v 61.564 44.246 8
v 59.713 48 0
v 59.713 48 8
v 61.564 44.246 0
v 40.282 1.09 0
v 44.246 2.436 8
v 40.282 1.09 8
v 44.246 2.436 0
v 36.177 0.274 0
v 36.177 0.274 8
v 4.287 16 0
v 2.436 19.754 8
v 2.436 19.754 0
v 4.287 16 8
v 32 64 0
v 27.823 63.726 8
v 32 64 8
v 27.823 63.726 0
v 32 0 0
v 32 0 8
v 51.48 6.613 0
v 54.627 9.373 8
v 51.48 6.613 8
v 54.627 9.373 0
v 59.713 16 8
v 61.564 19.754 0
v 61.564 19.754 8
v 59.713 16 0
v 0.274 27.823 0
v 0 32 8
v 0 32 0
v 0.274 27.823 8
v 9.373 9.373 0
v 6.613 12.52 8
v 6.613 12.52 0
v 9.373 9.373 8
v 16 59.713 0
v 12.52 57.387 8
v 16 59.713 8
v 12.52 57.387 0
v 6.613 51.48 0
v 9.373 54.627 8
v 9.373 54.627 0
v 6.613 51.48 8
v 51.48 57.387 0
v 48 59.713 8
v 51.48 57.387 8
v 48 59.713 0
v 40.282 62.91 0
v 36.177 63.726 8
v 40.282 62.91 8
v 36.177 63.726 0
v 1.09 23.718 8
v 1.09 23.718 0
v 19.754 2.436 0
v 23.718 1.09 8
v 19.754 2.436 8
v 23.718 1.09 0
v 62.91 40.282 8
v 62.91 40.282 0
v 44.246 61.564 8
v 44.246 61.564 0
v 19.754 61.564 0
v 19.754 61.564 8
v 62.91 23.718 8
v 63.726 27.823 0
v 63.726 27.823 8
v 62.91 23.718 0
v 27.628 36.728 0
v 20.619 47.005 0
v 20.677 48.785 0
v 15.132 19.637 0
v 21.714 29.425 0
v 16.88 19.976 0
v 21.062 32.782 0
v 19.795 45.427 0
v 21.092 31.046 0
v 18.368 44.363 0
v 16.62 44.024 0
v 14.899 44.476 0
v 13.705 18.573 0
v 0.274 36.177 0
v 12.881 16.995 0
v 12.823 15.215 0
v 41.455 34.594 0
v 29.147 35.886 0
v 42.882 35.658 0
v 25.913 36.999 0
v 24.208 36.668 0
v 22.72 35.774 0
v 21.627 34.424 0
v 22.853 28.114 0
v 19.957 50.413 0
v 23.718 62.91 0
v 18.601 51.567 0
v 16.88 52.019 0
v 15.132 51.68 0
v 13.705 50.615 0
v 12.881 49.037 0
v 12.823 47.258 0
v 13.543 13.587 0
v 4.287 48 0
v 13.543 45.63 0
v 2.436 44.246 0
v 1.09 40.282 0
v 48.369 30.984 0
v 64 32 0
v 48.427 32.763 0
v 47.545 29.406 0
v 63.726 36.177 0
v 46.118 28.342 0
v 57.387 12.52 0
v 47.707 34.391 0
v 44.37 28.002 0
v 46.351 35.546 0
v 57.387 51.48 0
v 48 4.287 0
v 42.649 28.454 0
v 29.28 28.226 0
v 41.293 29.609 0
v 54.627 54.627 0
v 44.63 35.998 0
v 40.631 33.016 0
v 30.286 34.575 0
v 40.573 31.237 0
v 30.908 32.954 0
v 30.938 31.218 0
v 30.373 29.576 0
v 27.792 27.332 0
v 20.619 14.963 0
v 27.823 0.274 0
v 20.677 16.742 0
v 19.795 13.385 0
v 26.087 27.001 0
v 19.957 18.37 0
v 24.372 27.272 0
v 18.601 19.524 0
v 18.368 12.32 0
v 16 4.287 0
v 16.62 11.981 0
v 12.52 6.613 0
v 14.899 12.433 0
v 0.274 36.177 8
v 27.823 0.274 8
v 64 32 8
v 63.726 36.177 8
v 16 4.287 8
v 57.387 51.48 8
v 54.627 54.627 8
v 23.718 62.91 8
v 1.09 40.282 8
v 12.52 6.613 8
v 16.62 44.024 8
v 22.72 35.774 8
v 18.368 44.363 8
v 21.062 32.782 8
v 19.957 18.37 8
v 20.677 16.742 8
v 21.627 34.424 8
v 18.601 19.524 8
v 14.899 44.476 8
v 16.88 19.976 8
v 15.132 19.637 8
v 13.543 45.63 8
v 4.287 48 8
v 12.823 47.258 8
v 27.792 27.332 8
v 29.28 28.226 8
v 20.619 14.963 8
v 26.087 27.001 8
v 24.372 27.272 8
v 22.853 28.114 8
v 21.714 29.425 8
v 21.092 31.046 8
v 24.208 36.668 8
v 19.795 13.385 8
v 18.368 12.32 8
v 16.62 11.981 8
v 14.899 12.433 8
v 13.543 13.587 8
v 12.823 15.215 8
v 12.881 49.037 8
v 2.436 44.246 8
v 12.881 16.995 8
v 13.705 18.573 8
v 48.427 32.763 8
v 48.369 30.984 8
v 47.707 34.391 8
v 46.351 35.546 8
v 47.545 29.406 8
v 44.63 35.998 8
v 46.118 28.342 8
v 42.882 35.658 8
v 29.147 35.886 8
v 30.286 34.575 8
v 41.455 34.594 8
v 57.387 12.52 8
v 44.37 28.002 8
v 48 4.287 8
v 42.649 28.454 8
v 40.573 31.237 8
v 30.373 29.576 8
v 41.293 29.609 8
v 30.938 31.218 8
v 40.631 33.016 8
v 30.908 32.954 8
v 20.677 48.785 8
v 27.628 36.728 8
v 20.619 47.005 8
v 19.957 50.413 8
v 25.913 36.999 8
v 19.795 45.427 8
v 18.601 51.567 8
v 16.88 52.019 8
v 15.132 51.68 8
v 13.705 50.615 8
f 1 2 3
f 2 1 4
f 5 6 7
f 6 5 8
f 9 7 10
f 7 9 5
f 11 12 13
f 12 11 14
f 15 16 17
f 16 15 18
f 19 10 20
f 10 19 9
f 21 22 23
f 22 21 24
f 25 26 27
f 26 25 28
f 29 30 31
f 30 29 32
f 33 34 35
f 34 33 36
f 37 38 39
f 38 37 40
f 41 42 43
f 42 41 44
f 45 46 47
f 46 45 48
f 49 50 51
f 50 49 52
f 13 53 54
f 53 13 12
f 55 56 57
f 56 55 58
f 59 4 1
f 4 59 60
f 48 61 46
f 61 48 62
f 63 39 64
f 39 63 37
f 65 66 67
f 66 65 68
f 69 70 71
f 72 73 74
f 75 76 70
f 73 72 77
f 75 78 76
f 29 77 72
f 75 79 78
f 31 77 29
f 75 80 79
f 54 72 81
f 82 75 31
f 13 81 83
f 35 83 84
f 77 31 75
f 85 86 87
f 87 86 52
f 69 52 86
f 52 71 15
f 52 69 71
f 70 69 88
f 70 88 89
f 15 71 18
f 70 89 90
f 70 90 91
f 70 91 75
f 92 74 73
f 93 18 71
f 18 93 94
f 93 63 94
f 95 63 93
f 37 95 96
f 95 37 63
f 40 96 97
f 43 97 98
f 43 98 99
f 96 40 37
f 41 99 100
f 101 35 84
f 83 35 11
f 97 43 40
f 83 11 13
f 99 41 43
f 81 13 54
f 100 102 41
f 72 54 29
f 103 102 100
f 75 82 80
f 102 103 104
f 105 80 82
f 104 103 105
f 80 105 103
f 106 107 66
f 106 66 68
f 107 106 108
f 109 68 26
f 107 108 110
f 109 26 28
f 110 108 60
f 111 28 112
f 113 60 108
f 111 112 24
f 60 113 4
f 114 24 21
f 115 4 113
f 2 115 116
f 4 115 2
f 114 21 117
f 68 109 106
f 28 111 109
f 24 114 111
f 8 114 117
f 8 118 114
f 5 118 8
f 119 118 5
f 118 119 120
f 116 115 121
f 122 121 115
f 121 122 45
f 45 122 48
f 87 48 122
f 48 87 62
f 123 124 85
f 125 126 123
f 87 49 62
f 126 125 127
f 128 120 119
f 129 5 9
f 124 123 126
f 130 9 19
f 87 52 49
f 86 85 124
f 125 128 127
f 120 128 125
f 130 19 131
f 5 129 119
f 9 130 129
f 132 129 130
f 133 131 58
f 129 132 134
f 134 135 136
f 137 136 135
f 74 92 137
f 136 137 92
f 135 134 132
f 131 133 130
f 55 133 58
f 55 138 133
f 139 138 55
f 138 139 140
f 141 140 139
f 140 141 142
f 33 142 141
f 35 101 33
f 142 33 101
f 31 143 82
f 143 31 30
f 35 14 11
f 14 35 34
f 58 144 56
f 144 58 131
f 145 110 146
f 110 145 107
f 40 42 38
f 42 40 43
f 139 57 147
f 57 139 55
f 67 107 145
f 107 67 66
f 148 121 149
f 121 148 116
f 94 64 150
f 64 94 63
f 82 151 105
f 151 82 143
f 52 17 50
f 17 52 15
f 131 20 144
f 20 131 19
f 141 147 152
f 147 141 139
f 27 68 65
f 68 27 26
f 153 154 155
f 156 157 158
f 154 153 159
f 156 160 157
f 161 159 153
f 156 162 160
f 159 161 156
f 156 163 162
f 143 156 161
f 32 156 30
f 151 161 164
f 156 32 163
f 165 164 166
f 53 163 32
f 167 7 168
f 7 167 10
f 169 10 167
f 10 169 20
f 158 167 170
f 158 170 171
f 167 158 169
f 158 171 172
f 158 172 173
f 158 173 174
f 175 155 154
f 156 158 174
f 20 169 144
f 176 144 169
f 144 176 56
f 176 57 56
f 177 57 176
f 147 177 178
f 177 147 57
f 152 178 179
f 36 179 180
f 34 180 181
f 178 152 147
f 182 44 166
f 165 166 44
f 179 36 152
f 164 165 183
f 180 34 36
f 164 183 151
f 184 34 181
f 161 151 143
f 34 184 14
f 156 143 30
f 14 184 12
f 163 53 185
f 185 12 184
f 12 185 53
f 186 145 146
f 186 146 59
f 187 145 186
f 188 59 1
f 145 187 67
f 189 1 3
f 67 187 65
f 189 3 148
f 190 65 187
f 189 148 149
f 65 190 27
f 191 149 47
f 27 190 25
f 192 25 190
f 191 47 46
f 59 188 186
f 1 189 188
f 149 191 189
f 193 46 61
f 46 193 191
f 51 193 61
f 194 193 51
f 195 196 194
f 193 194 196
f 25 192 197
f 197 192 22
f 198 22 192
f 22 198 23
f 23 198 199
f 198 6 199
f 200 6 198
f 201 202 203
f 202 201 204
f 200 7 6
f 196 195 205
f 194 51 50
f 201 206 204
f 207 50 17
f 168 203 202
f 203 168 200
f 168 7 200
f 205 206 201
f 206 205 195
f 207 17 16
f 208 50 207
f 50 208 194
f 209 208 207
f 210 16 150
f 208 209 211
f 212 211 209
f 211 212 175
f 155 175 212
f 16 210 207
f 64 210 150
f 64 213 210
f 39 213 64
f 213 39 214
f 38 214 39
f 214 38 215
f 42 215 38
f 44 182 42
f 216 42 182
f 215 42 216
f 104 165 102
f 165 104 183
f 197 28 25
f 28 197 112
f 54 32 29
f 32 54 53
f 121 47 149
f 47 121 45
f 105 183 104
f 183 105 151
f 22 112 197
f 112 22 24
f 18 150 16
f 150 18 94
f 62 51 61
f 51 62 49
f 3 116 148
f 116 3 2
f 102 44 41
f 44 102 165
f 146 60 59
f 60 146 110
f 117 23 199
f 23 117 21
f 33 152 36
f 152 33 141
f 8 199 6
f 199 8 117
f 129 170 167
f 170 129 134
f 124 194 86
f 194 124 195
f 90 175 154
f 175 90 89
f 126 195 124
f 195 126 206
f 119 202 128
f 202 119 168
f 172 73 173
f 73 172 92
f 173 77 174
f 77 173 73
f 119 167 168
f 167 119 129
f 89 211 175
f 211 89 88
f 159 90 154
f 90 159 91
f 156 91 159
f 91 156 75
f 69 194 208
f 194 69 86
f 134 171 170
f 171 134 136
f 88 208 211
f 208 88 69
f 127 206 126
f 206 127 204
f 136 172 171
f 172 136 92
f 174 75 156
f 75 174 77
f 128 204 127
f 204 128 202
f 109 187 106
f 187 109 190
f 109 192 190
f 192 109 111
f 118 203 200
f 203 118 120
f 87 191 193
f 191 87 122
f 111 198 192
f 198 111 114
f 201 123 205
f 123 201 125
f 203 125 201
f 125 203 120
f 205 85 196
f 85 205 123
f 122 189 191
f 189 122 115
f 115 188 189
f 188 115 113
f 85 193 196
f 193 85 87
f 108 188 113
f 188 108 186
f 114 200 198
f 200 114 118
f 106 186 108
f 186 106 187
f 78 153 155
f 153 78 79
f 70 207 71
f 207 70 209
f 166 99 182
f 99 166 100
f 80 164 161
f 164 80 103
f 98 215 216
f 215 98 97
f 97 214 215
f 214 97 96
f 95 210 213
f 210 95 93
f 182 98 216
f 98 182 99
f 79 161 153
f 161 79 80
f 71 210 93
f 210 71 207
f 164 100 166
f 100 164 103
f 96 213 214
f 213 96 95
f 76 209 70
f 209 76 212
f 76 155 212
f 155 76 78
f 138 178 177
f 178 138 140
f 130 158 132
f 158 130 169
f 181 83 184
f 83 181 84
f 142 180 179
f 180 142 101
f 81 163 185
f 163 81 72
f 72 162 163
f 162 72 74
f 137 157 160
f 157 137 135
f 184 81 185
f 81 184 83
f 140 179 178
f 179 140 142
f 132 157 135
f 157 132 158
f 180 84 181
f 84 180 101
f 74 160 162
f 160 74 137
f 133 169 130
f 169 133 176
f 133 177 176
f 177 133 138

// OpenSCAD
$fn = 32;

// ----------------------------------------------------------------------
// Cam plate: eccentric cam, base R32
// ----------------------------------------------------------------------

// --- parameters (mm) ---
base_r = 32;              // base circle radius
lobe_h = 12;              // cam lobe rise
bore_r = 5;               // shaft bore radius
plate_t = 8;              // plate thickness, Z (extrusion height)
ecc = 6;                  // disc eccentricity
ring_r = 18.5;            // lightening ring radius
bolt_r = 4;               // lightening hole radius

profile = [[64, 32], [63.726, 36.177], [62.91, 40.282], [61.564, 44.246], [59.713, 48], [57.387, 51.48], [54.627, 54.627], [51.48, 57.387], [48, 59.713], [44.246, 61.564], [40.282, 62.91], [36.177, 63.726], [32, 64], [27.823, 63.726], [23.718, 62.91], [19.754, 61.564], [16, 59.713], [12.52, 57.387], [9.373, 54.627], [6.613, 51.48], [4.287, 48], [2.436, 44.246], [1.09, 40.282], [0.274, 36.177], [0, 32], [0.274, 27.823], [1.09, 23.718], [2.436, 19.754], [4.287, 16], [6.613, 12.52], [9.373, 9.373], [12.52, 6.613], [16, 4.287], [19.754, 2.436], [23.718, 1.09], [27.823, 0.274], [32, 0], [36.177, 0.274], [40.282, 1.09], [44.246, 2.436], [48, 4.287], [51.48, 6.613], [54.627, 9.373], [57.387, 12.52], [59.713, 16], [61.564, 19.754], [62.91, 23.718], [63.726, 27.823]];  // primary outline, 48 points, counter clockwise
void_1 = [[30.908, 32.954], [30.286, 34.575], [29.147, 35.886], [27.628, 36.728], [25.913, 36.999], [24.208, 36.668], [22.72, 35.774], [21.627, 34.424], [21.062, 32.782], [21.092, 31.046], [21.714, 29.425], [22.853, 28.114], [24.372, 27.272], [26.087, 27.001], [27.792, 27.332], [29.28, 28.226], [30.373, 29.576], [30.938, 31.218]];  // shaft bore, 18 points
void_2 = [[48.427, 32.763], [47.707, 34.391], [46.351, 35.546], [44.63, 35.998], [42.882, 35.658], [41.455, 34.594], [40.631, 33.016], [40.573, 31.237], [41.293, 29.609], [42.649, 28.454], [44.37, 28.002], [46.118, 28.342], [47.545, 29.406], [48.369, 30.984]];  // lightening hole 1, 14 points
void_3 = [[20.677, 48.785], [19.957, 50.413], [18.601, 51.567], [16.88, 52.019], [15.132, 51.68], [13.705, 50.615], [12.881, 49.037], [12.823, 47.258], [13.543, 45.63], [14.899, 44.476], [16.62, 44.024], [18.368, 44.363], [19.795, 45.427], [20.619, 47.005]];  // lightening hole 2, 14 points
void_4 = [[20.677, 16.742], [19.957, 18.37], [18.601, 19.524], [16.88, 19.976], [15.132, 19.637], [13.705, 18.573], [12.881, 16.995], [12.823, 15.215], [13.543, 13.587], [14.899, 12.433], [16.62, 11.981], [18.368, 12.32], [19.795, 13.385], [20.619, 14.963]];  // lightening hole 3, 14 points

// --- the one profile operation ---
difference() {
  linear_extrude(height = plate_t) polygon(points = profile);
  translate([0, 0, -1])
    linear_extrude(height = plate_t + 2) polygon(points = void_1);
  translate([0, 0, -1])
    linear_extrude(height = plate_t + 2) polygon(points = void_2);
  translate([0, 0, -1])
    linear_extrude(height = plate_t + 2) polygon(points = void_3);
  translate([0, 0, -1])
    linear_extrude(height = plate_t + 2) polygon(points = void_4);
}
